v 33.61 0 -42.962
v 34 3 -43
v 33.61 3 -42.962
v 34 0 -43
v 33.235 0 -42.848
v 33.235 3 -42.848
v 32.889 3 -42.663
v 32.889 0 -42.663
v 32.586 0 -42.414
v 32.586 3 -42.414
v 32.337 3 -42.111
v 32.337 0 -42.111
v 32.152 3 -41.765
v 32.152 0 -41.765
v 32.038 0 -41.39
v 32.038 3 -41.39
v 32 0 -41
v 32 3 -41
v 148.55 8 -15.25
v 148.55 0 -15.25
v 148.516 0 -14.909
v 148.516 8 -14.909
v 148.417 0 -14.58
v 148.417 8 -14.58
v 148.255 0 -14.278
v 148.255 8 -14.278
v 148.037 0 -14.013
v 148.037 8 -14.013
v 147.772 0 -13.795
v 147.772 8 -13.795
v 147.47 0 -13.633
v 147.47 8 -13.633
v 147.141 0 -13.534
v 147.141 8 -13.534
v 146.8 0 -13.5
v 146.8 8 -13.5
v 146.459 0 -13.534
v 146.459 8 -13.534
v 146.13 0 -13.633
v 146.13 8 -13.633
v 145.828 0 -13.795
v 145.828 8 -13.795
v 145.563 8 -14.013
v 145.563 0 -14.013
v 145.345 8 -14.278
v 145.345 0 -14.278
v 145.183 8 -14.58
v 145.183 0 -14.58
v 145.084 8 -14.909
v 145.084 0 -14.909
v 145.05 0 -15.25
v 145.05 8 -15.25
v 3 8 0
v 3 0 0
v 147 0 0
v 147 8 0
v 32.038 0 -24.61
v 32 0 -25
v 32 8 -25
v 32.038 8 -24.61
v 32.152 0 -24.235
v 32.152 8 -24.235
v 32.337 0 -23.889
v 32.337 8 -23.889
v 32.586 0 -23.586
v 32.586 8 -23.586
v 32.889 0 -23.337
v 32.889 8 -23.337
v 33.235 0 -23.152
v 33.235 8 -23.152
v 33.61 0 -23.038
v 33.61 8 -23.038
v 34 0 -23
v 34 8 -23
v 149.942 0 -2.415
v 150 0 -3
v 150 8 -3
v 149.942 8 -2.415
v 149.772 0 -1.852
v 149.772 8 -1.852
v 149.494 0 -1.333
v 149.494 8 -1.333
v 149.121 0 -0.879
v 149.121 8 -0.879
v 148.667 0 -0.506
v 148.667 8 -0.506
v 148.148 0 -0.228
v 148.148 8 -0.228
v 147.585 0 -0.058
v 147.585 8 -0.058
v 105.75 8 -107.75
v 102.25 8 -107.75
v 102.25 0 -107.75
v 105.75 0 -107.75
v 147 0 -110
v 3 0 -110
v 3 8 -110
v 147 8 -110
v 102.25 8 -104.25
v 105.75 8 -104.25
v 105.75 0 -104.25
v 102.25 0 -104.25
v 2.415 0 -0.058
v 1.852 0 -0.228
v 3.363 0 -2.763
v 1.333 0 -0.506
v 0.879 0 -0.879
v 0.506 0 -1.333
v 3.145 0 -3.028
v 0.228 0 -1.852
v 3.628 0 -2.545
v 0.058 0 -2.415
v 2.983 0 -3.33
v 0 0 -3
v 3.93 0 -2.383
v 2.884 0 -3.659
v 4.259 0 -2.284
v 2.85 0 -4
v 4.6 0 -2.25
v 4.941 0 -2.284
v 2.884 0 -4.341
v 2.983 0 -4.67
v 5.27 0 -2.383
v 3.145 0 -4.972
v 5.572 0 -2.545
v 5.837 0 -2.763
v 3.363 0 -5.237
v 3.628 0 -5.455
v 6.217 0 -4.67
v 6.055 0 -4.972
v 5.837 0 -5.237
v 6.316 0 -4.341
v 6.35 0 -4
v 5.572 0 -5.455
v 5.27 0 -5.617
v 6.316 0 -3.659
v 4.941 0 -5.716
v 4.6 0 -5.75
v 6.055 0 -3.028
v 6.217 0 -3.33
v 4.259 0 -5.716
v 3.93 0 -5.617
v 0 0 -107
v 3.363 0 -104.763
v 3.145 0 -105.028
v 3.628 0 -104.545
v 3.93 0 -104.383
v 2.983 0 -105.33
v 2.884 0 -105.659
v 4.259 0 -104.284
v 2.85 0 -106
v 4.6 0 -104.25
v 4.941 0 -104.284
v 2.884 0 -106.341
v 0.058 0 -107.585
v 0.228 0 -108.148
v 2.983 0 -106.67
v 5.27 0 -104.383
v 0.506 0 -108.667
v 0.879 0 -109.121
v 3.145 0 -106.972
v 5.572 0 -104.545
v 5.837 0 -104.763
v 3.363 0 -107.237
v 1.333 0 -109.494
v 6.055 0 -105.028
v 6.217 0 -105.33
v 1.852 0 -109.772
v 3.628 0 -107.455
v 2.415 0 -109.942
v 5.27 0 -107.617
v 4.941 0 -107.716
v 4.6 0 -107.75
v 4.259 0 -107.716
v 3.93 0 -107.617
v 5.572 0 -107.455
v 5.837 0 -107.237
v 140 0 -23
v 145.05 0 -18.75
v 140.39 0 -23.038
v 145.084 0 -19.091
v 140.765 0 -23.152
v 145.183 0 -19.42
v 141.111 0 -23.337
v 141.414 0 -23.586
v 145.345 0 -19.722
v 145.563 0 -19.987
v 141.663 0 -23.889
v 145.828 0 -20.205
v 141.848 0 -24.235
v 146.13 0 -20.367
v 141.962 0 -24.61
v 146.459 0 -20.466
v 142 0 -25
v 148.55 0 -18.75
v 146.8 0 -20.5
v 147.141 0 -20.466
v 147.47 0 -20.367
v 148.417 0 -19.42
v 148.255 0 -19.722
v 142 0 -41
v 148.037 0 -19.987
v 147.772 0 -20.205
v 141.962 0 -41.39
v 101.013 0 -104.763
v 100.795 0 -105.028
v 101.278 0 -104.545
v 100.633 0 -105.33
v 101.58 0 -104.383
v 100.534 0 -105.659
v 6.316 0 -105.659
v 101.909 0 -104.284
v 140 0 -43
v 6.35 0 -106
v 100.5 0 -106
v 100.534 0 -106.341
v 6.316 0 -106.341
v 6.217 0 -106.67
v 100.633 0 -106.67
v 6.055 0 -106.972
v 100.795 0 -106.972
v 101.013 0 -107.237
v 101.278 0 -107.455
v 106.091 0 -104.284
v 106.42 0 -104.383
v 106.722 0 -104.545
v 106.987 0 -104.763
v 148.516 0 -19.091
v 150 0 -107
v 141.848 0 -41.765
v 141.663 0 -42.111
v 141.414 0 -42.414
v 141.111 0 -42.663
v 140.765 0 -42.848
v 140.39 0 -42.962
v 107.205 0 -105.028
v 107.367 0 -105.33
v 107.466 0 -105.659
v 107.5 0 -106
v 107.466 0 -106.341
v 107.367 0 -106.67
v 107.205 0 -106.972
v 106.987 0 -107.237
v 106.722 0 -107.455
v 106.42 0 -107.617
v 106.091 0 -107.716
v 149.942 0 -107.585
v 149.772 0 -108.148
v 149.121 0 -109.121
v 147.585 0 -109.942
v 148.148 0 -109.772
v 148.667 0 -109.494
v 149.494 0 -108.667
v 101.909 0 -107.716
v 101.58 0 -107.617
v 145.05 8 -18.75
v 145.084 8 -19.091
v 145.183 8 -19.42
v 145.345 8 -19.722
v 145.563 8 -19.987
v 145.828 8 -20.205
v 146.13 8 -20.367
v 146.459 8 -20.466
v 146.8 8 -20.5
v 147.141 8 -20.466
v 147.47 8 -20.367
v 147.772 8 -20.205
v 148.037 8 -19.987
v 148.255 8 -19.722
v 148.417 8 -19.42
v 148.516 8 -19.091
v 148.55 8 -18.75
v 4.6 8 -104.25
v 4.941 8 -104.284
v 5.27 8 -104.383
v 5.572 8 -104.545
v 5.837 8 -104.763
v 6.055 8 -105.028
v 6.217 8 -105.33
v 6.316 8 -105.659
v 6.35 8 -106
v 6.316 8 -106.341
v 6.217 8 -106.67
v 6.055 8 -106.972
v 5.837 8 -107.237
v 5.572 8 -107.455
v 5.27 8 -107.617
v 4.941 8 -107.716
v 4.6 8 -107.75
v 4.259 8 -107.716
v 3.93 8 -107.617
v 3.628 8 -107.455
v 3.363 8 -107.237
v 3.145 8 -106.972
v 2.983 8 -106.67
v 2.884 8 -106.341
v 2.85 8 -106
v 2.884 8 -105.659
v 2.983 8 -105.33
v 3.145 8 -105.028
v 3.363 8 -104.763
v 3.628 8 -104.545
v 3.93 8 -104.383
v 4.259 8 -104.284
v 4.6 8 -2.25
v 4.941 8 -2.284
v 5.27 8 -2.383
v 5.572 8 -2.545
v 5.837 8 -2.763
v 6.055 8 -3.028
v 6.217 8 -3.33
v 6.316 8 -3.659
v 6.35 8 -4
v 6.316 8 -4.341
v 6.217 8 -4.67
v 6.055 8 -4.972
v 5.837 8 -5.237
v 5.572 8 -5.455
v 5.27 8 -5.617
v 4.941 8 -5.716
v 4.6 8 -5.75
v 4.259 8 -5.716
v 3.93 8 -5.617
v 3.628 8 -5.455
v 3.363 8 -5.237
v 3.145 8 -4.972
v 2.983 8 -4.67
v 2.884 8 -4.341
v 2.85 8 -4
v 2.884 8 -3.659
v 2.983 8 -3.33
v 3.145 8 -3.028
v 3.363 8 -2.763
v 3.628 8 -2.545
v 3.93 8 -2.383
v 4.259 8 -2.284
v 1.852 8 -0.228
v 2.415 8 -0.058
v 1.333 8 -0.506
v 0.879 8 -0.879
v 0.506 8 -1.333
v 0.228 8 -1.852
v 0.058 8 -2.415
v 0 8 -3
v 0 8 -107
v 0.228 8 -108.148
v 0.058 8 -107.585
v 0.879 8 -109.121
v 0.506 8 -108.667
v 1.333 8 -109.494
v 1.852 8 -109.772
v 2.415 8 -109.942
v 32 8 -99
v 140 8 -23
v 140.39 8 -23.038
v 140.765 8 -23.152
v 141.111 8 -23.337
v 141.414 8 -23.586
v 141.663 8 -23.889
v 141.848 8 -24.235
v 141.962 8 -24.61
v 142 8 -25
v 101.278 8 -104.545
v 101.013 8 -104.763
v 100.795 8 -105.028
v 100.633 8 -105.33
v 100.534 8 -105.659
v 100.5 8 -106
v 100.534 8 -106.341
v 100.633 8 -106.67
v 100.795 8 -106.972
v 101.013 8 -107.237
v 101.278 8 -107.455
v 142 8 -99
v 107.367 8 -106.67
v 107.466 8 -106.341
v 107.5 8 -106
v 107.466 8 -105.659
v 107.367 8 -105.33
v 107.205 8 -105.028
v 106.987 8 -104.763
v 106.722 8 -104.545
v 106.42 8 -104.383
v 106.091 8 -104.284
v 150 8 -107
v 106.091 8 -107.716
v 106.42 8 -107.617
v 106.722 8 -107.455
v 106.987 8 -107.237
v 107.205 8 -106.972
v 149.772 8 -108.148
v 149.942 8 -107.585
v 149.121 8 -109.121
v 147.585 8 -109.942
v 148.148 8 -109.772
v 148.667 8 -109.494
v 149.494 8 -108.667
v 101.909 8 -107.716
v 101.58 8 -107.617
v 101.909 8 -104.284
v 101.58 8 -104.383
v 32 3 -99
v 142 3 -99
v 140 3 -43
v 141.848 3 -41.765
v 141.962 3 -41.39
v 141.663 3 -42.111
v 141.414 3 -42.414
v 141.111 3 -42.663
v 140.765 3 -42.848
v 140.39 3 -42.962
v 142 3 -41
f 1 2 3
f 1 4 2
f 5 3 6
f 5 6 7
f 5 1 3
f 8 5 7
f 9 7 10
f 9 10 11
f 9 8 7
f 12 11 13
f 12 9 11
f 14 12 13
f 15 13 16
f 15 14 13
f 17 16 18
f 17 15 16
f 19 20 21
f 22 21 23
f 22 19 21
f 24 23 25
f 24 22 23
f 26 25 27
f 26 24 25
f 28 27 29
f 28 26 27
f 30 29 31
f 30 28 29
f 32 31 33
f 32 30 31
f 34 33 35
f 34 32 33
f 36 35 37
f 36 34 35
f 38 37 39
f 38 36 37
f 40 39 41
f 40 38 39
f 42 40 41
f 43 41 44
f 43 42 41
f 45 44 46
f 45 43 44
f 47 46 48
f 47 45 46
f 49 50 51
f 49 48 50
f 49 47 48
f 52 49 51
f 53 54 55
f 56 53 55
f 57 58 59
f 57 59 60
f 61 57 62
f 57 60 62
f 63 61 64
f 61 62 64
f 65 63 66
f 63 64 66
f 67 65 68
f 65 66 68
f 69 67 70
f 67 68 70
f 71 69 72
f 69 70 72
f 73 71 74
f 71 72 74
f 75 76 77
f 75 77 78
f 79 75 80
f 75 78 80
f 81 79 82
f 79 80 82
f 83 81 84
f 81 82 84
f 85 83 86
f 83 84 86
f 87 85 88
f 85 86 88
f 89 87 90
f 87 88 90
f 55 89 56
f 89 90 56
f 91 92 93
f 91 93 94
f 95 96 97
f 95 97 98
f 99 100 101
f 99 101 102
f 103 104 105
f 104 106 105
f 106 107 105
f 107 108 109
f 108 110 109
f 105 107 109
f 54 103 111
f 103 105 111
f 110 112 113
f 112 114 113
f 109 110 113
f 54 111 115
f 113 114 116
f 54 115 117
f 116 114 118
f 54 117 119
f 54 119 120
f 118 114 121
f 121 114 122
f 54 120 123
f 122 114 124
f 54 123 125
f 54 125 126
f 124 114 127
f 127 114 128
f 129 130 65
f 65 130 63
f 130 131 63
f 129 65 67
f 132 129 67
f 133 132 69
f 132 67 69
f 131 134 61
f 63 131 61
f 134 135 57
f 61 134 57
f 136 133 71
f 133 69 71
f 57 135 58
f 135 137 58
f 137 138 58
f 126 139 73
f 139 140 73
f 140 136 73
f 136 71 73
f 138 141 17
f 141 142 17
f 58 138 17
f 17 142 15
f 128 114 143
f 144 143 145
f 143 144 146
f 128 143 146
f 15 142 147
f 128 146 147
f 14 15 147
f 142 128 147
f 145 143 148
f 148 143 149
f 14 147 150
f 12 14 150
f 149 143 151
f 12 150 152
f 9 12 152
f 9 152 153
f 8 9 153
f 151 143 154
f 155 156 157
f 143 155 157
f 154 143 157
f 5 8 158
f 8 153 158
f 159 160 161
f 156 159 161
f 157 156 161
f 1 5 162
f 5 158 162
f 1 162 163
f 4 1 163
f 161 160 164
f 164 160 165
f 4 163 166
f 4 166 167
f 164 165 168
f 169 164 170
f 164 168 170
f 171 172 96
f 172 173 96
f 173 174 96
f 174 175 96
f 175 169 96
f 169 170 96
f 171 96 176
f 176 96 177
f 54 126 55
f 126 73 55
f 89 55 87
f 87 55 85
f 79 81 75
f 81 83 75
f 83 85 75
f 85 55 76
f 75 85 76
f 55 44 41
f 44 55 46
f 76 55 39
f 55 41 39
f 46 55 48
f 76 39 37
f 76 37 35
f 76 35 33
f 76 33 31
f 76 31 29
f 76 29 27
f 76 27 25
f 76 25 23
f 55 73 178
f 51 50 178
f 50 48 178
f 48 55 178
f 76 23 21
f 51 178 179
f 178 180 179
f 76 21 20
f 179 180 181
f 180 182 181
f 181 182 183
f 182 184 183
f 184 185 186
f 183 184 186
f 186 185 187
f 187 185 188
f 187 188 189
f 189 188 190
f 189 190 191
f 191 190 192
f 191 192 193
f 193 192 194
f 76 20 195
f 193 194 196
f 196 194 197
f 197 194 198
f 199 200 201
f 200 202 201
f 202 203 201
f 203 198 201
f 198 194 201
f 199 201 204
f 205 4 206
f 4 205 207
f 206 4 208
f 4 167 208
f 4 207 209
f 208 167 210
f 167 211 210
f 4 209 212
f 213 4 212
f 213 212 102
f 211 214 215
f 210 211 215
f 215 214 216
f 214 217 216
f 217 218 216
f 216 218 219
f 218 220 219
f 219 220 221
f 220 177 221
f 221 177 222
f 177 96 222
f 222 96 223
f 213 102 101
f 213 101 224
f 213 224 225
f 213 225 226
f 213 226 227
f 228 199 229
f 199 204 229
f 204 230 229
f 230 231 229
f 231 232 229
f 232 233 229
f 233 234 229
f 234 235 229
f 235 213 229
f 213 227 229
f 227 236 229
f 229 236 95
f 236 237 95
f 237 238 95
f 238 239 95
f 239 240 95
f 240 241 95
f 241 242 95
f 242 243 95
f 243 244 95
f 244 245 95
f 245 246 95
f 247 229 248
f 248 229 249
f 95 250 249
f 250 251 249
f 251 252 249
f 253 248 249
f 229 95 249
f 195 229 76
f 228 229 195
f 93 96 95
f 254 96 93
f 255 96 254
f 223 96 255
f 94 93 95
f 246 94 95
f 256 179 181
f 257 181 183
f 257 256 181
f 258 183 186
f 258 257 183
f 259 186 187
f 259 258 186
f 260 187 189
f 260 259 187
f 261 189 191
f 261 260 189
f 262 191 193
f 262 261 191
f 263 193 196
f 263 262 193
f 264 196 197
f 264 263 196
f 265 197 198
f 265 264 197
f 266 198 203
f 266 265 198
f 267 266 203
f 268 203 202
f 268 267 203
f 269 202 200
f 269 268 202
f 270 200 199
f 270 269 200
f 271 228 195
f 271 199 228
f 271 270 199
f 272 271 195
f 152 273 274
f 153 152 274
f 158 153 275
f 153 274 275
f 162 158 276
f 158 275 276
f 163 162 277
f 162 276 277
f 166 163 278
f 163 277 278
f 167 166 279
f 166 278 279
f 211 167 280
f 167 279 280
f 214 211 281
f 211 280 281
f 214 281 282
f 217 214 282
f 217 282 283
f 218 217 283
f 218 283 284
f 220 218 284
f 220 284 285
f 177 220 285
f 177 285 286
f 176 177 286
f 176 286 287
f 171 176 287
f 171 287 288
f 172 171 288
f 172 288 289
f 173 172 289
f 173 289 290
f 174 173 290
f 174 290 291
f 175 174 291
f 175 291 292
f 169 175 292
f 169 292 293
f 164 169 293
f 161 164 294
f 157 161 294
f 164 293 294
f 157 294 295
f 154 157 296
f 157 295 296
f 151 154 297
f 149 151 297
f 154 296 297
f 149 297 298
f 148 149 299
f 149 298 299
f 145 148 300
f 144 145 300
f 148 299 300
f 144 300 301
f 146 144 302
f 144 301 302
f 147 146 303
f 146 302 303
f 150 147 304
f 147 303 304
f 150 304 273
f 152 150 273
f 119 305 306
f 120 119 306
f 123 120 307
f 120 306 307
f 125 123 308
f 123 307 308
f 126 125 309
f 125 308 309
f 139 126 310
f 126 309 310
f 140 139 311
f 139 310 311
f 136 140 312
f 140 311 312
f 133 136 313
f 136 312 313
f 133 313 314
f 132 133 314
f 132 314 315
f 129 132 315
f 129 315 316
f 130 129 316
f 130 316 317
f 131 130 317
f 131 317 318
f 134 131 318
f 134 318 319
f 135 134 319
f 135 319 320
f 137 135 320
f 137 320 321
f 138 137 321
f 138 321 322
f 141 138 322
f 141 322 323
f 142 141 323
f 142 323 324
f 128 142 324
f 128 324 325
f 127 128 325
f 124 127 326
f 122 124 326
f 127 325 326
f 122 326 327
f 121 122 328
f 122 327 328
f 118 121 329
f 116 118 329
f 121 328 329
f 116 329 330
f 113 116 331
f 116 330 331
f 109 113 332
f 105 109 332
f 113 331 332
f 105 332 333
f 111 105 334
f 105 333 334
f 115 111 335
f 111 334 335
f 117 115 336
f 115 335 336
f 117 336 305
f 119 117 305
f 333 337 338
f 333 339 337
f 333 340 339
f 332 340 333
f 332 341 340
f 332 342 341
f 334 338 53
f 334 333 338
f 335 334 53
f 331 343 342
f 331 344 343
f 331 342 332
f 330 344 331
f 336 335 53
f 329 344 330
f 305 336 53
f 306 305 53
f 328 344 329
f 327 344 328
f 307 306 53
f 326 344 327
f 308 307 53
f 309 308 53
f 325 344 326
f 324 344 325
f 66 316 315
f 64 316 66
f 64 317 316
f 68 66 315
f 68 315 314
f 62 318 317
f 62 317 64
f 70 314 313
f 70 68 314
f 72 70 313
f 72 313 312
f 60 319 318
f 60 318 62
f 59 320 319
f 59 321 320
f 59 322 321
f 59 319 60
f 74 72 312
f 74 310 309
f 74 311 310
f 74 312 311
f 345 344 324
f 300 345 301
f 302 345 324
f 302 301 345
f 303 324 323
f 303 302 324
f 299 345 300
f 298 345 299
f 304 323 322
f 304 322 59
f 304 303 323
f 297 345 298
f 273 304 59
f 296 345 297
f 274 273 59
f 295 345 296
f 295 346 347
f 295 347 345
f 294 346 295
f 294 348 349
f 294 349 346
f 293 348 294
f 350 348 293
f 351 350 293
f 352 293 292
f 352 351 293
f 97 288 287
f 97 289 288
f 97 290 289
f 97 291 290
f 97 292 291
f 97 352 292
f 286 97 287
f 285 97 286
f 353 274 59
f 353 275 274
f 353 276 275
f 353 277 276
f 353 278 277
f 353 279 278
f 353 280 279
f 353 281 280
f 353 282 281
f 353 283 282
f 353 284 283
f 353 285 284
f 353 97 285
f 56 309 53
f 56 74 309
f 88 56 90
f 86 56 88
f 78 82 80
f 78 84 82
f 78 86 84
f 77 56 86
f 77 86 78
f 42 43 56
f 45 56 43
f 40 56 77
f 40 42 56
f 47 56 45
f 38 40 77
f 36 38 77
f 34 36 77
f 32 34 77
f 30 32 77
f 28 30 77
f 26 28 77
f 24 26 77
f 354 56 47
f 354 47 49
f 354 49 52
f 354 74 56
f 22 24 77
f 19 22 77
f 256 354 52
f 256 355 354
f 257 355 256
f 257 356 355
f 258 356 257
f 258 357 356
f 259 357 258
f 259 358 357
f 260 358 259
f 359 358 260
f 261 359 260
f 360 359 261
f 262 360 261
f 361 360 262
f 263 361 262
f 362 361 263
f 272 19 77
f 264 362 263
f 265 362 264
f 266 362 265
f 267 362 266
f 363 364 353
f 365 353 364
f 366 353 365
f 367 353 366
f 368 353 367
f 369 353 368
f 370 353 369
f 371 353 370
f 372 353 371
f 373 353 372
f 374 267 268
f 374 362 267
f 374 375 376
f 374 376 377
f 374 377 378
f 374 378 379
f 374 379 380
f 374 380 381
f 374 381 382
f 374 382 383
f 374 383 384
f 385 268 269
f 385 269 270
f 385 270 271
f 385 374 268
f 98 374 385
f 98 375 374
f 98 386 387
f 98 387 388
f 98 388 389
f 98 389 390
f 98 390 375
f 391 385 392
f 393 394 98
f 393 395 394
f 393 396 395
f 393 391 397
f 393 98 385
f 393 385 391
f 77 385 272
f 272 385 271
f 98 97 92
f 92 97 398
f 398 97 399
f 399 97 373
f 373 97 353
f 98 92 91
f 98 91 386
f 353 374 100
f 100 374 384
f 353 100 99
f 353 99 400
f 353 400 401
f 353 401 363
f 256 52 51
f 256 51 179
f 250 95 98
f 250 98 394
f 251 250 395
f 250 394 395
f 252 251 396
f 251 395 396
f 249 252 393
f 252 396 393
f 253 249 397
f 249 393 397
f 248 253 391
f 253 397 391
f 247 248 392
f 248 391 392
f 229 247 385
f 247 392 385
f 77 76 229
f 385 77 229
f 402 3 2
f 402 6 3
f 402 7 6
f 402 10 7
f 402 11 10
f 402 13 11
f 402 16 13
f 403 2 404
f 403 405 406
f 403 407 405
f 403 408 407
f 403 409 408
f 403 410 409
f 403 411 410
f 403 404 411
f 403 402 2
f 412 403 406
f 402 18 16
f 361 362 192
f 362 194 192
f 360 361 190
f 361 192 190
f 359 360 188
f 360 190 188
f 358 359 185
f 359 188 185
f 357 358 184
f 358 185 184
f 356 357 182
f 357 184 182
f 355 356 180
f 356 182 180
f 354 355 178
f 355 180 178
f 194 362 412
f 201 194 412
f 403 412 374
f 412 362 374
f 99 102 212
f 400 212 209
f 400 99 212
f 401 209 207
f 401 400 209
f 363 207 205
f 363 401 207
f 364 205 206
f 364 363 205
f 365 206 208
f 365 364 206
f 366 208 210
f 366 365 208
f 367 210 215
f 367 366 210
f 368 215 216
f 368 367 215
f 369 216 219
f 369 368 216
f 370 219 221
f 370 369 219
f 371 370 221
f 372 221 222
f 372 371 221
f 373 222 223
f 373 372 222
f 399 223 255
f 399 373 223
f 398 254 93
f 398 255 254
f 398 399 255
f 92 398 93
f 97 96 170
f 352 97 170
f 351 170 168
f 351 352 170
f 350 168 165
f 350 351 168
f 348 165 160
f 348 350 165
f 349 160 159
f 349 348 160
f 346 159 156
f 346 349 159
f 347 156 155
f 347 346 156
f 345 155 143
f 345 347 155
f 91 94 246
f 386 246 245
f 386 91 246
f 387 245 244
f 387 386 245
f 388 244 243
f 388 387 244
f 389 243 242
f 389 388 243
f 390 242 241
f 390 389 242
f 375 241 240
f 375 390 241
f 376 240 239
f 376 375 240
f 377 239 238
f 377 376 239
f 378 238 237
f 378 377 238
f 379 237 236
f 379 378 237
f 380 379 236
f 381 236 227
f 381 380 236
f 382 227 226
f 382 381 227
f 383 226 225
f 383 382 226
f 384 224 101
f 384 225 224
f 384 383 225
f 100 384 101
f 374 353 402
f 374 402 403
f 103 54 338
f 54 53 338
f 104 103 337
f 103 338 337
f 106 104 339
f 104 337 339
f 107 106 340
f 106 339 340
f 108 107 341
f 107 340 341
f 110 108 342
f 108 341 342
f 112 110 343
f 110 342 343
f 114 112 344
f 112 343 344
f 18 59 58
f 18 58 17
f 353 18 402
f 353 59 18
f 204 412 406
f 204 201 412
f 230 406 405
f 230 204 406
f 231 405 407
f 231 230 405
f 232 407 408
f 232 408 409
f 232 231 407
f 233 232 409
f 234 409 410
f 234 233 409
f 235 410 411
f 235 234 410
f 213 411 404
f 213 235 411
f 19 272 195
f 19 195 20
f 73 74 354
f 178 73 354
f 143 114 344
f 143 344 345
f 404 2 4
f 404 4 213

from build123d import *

# Parameters (mm, degrees)
SKETCH_1_W          = 150
SKETCH_1_H          = 110
EXTRUDE_1_DEPTH     = 8
SKETCH_2_R          = 1.75
CUT_EXTRUDE_1_DEPTH = 187.182705964
CUT_EXTRUDE_2_DEPTH = 187.182705964
SKETCH_4_W          = 110
SKETCH_4_H          = 20
CUT_EXTRUDE_3_DEPTH = 187.182705964
SKETCH_5_W          = 110
SKETCH_5_H          = 76
CUT_EXTRUDE_4_DEPTH = 5
FILLET_1_R          = 2
FILLET_2_R          = 3


with BuildPart() as part:
    # 草图1 → 凸台-拉伸1 (new body)
    with BuildSketch(Plane(origin=(0, 0, 0), x_dir=(1, 0, 0), z_dir=(0, 1, 0))):
        with Locations((75, 55)):
            Rectangle(SKETCH_1_W, SKETCH_1_H)
    extrude(amount=EXTRUDE_1_DEPTH)

    # 草图2 → 切除-拉伸1 (cut, through all)
    with BuildSketch(Plane(origin=(0, 8, 0), x_dir=(1, 0, 0), z_dir=(0, 1, 0))):
        with Locations(Location((4.6, 106, 0), (0, 0, 270))):
            Circle(SKETCH_2_R)
        with Locations(Location((4.6, 4, 0), (0, 0, 270))):
            Circle(SKETCH_2_R)
        with Locations(Location((104, 106, 0), (0, 0, 270))):
            Circle(SKETCH_2_R)
        with Locations(Location((146.8, 17, 0), (0, 0, 270))):
            Circle(SKETCH_2_R)
    extrude(amount=-CUT_EXTRUDE_1_DEPTH, mode=Mode.SUBTRACT)

    # 草图3 → 切除-拉伸2 (cut, through all)
    with BuildSketch(Plane(origin=(0, 8, 0), x_dir=(1, 0, 0), z_dir=(0, 1, 0))):
        with BuildLine():
            Line((102.25, 107.75), (105.75, 107.75))
            ThreePointArc((105.75, 107.75), (107.5, 106), (105.75, 104.25))
            Line((105.75, 104.25), (102.25, 104.25))
            ThreePointArc((102.25, 104.25), (100.5, 106), (102.25, 107.75))
        make_face()
        with BuildLine():
            Line((145.05, 15.25), (145.05, 18.75))
            ThreePointArc((145.05, 18.75), (146.8, 20.5), (148.55, 18.75))
            Line((148.55, 18.75), (148.55, 15.25))
            ThreePointArc((148.55, 15.25), (146.8, 13.5), (145.05, 15.25))
        make_face()
    extrude(amount=-CUT_EXTRUDE_2_DEPTH, mode=Mode.SUBTRACT)

    # 草图4 → 切除-拉伸3 (cut, through all)
    with BuildSketch(Plane(origin=(0, 8, 0), x_dir=(1, 0, 0), z_dir=(0, 1, 0))):
        with Locations((87, 33)):
            Rectangle(SKETCH_4_W, SKETCH_4_H)
    extrude(amount=-CUT_EXTRUDE_3_DEPTH, mode=Mode.SUBTRACT)

    # 草图5 → 切除-拉伸4 (cut)
    with BuildSketch(Plane(origin=(0, 8, 0), x_dir=(1, 0, 0), z_dir=(0, 1, 0))):
        with Locations((87, 61)):
            Rectangle(SKETCH_5_W, SKETCH_5_H)
    extrude(amount=-CUT_EXTRUDE_4_DEPTH, mode=Mode.SUBTRACT)

    # 圆角1
    fillet_1_edges = [part.edges().sort_by_distance(p)[0] for p in [
        (32, 4, -23),
        (32, 1.5, -43),
        (142, 1.5, -43),
        (142, 4, -23),
    ]]
    fillet(fillet_1_edges, radius=FILLET_1_R)

    # 圆角2
    fillet_2_edges = [part.edges().sort_by_distance(p)[0] for p in [
        (0, 4, -110),
        (150, 4, -110),
        (150, 4, 0),
        (0, 4, 0),
    ]]
    fillet(fillet_2_edges, radius=FILLET_2_R)


solid = part.part
